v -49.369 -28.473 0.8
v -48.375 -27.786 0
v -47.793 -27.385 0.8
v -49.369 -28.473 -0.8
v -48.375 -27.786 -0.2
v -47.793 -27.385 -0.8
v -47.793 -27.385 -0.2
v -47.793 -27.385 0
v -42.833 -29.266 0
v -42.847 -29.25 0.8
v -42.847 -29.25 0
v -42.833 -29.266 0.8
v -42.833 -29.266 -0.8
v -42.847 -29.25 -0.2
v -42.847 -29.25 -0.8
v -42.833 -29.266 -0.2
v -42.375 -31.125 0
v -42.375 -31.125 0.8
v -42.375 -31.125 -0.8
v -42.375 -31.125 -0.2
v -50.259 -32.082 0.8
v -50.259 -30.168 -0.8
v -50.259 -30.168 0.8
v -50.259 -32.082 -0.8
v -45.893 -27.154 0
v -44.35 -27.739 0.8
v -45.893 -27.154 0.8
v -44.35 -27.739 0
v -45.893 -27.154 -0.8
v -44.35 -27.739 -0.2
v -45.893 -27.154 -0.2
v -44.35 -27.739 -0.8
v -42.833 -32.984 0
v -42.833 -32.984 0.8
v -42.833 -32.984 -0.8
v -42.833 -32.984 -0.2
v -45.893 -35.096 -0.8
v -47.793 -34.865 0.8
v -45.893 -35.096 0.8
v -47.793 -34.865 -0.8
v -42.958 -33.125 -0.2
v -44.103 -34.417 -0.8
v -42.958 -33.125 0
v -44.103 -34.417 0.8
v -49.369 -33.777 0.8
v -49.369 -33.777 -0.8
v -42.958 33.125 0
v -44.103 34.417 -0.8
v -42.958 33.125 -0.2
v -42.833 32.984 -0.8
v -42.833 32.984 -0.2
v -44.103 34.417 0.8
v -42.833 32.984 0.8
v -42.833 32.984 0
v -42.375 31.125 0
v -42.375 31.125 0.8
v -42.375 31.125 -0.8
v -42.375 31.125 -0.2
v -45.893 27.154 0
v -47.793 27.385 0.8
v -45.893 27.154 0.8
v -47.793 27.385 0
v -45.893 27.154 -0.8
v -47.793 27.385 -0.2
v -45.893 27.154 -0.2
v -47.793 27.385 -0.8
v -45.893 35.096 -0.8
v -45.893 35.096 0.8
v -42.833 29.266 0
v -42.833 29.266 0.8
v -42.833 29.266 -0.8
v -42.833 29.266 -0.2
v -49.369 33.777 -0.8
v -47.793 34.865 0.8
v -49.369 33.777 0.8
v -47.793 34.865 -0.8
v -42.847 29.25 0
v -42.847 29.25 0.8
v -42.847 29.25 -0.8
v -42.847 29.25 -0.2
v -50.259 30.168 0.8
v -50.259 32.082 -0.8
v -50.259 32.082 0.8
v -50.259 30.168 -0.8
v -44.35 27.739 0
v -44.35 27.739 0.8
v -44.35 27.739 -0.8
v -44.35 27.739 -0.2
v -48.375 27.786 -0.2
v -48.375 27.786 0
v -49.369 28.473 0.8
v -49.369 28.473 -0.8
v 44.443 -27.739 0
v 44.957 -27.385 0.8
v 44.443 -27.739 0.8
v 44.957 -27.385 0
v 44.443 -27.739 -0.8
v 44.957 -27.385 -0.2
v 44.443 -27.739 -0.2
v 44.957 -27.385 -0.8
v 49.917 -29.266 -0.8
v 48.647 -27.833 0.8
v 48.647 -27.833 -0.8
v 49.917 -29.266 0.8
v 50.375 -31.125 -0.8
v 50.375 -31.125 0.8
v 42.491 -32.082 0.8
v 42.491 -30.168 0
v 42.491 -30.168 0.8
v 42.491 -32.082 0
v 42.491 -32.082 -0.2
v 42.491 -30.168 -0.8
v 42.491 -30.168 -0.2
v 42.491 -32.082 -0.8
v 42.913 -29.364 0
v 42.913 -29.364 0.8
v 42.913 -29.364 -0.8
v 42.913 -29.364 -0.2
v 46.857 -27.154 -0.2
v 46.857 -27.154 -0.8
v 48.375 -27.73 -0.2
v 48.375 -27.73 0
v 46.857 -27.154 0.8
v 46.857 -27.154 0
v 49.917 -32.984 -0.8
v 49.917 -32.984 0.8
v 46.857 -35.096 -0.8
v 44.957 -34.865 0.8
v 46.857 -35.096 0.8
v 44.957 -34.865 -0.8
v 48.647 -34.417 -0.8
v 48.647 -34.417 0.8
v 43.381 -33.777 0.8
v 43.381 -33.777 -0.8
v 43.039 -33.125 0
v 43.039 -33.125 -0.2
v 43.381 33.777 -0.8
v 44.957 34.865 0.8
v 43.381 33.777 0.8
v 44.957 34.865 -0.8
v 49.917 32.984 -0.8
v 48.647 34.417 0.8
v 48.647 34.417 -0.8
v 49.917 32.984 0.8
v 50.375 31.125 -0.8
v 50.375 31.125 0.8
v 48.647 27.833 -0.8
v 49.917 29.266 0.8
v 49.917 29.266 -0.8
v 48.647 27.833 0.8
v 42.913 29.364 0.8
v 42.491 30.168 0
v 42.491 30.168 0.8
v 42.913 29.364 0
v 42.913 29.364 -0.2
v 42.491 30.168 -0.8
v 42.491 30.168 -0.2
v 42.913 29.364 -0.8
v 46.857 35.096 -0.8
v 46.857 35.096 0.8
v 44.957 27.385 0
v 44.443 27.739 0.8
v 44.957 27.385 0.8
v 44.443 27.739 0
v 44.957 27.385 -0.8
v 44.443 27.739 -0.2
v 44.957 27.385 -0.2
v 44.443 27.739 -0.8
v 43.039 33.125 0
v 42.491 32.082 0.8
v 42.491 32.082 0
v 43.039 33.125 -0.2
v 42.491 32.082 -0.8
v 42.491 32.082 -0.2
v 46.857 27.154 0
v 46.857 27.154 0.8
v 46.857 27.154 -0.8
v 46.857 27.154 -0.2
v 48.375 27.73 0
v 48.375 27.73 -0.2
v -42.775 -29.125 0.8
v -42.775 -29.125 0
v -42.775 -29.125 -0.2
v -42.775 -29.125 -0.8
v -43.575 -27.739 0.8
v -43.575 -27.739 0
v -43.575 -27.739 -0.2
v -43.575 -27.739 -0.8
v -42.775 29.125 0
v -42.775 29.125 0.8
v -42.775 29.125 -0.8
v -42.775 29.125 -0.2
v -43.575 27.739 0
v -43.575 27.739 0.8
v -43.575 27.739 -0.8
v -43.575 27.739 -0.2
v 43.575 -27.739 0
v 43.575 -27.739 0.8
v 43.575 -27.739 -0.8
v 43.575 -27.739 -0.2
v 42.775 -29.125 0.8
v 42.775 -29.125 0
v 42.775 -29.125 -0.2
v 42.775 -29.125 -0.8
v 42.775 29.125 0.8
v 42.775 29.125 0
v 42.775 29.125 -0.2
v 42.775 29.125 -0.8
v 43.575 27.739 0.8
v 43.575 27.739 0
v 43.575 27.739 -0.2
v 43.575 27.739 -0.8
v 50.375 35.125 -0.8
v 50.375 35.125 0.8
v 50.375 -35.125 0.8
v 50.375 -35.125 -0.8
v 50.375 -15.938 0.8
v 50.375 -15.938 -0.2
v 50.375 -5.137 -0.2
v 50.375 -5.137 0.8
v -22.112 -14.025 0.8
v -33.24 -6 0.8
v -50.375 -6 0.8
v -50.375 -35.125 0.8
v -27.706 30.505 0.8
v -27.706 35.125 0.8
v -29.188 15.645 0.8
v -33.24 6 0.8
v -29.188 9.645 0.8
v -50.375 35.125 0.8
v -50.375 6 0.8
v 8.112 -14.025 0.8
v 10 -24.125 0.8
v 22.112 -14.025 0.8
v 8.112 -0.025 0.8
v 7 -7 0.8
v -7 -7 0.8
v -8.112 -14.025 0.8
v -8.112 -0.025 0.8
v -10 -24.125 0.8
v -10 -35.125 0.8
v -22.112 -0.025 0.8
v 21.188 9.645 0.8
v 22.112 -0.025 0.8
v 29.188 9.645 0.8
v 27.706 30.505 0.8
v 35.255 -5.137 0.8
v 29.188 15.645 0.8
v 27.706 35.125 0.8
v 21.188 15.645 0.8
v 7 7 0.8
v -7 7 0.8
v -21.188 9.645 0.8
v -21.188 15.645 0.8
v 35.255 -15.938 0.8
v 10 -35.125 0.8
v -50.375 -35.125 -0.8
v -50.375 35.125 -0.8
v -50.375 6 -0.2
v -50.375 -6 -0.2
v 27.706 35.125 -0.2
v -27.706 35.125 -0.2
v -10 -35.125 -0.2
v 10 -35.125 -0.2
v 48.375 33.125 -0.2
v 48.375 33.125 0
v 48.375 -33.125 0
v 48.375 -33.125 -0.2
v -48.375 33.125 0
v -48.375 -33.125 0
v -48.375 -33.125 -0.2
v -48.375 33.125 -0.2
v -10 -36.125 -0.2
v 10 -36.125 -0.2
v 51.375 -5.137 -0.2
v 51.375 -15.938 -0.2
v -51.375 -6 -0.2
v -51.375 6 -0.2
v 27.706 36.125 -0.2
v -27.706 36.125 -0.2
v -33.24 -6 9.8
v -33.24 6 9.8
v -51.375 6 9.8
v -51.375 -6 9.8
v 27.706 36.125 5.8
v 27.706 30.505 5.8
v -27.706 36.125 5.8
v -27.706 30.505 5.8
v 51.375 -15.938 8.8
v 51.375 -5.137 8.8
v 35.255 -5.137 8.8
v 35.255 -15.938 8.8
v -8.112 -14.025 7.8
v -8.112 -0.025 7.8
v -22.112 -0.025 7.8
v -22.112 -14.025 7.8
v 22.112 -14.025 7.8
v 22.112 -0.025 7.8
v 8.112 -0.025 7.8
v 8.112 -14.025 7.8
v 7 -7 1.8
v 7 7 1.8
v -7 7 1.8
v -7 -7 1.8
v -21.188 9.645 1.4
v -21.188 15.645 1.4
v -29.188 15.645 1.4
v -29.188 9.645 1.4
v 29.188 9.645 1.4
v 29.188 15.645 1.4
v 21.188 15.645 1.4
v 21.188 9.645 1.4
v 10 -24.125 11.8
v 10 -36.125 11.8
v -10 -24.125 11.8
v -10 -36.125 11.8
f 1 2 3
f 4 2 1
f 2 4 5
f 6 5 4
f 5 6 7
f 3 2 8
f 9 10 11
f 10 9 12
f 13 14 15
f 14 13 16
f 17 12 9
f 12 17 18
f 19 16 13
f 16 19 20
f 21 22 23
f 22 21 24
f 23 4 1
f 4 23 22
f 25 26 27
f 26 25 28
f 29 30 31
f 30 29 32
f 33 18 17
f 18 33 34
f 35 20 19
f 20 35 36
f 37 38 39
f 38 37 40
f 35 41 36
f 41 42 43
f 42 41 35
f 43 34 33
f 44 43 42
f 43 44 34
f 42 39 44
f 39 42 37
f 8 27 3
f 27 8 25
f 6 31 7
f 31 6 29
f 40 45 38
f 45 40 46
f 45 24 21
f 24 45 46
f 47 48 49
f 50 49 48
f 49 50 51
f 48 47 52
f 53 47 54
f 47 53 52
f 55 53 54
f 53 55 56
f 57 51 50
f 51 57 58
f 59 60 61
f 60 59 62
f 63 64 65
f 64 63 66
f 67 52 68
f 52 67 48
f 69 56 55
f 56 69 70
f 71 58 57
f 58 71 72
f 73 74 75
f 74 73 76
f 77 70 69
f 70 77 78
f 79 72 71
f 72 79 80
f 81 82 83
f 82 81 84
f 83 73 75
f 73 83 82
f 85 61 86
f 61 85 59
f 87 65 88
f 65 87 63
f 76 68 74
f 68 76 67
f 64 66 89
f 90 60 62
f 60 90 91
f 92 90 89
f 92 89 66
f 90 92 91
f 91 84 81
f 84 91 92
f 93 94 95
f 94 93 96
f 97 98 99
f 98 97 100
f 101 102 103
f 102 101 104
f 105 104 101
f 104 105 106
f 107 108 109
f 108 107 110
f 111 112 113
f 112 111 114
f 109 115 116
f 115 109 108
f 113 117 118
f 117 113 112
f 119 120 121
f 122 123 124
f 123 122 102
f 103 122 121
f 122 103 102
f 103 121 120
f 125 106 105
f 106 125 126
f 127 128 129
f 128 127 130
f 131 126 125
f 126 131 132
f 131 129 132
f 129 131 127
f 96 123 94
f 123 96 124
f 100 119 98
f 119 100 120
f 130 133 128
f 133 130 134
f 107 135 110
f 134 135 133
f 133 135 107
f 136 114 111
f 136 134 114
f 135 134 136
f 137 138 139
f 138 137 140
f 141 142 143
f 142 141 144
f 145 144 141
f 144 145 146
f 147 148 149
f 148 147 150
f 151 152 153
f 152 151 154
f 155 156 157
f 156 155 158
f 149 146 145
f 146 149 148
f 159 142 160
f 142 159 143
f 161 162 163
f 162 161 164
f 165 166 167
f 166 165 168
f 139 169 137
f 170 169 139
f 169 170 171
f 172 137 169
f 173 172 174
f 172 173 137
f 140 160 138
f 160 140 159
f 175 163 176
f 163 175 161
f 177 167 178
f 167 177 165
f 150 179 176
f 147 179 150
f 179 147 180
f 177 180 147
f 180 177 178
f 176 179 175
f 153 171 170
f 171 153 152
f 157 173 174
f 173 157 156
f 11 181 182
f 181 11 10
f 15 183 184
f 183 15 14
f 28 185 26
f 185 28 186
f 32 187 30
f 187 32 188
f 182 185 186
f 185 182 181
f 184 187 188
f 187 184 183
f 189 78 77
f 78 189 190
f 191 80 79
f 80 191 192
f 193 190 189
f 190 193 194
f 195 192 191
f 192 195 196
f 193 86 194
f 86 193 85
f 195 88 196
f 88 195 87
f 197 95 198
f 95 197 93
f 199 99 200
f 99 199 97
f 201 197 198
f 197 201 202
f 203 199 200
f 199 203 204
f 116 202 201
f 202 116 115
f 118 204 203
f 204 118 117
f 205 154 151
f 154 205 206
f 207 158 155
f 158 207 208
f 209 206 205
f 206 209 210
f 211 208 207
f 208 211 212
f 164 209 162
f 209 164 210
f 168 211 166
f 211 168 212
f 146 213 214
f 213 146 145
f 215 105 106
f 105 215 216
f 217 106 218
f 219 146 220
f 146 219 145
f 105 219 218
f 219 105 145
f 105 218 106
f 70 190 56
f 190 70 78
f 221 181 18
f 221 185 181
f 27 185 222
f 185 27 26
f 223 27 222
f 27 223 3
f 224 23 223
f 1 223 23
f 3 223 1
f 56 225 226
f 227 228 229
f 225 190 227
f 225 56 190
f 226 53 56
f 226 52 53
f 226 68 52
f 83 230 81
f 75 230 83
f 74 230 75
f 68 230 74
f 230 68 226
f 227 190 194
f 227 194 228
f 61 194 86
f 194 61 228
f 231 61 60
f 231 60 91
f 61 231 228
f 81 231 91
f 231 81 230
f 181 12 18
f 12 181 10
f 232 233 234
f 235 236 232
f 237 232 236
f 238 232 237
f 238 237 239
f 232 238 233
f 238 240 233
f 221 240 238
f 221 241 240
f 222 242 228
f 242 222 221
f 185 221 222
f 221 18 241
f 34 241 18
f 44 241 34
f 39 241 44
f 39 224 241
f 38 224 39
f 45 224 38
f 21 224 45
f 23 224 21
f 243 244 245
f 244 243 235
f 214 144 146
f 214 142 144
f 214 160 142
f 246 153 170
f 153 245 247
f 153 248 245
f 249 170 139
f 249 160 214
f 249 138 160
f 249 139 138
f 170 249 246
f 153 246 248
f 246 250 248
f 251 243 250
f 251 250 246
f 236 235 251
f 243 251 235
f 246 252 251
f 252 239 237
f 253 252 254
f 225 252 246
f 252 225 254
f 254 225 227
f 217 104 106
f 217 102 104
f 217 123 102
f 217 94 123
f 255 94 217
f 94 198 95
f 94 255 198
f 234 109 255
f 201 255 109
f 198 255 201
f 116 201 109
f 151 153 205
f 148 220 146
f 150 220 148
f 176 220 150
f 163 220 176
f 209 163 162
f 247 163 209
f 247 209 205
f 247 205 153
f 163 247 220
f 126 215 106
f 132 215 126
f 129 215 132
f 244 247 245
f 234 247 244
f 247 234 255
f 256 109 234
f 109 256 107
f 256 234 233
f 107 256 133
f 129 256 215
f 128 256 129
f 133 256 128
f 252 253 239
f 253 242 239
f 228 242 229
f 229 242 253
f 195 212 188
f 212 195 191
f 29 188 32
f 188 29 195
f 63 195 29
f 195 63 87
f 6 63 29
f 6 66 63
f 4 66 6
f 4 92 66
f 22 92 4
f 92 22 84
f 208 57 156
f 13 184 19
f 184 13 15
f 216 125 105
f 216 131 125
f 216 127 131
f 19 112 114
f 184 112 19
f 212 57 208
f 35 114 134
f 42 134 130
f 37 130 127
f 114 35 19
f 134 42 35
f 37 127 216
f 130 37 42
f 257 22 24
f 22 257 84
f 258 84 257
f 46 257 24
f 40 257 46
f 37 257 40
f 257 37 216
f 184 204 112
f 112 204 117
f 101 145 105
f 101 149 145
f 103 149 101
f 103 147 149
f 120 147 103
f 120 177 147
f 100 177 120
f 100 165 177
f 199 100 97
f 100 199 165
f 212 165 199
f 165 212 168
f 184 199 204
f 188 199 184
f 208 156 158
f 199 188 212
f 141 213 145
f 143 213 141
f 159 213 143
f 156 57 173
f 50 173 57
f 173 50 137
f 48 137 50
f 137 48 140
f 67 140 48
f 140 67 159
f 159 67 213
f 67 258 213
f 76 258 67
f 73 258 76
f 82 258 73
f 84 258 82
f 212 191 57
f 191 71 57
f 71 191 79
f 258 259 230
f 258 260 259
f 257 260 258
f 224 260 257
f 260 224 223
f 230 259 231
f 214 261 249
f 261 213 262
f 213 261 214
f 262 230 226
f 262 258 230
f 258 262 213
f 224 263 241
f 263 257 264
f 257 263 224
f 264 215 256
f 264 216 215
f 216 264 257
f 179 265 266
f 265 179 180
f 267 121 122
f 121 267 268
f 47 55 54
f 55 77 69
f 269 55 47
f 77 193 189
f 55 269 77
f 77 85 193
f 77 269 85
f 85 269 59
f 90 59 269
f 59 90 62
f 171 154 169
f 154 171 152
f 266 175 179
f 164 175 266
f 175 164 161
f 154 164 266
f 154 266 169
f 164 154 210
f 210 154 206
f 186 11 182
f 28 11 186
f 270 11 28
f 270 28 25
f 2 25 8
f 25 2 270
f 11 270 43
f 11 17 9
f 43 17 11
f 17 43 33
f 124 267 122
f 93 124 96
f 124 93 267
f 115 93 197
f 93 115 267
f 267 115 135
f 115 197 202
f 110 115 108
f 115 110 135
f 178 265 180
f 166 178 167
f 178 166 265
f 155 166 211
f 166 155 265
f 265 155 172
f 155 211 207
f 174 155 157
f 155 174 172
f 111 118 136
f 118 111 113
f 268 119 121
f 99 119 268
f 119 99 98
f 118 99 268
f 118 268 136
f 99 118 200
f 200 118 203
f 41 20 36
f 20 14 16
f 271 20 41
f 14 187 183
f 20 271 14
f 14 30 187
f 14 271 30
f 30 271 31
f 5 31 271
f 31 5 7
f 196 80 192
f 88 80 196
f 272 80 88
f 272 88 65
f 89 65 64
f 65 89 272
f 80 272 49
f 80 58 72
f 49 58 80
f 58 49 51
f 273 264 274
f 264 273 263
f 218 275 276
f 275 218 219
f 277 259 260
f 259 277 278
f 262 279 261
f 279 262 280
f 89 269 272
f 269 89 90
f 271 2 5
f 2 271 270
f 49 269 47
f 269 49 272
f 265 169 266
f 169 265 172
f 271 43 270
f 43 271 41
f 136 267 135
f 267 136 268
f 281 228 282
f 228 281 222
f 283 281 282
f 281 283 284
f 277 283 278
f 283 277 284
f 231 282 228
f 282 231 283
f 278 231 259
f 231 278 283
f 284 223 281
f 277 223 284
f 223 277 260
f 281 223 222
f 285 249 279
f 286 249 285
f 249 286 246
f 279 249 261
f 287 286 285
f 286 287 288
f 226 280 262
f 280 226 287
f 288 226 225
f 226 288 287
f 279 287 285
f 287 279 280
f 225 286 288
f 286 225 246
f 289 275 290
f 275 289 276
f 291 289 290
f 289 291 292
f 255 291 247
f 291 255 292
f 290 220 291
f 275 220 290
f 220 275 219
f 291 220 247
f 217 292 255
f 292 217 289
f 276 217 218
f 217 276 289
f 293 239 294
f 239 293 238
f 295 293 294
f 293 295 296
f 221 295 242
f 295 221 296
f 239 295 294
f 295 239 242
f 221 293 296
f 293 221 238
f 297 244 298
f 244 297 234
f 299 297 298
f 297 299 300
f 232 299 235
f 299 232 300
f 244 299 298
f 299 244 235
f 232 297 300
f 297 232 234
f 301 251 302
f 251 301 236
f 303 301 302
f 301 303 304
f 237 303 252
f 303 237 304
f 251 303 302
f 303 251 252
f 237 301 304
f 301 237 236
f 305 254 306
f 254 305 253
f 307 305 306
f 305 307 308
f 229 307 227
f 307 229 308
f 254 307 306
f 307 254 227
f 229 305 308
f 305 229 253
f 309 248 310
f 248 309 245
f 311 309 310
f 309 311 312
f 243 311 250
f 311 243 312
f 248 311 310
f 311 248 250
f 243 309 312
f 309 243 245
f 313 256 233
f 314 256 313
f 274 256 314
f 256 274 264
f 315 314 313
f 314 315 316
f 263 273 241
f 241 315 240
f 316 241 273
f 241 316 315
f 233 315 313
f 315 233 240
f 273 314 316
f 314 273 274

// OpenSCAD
// Parameters
board_length = 100.75; //[50.375:201.5:0.25]
board_width = 70.25; //[35.125:140.5:0.25]
board_thickness = 1.6; //[0.8:3.2:0.1]
corner_radius = 4; //[2:8:0.5]
mount_hole_diameter = 3.2; //[2.4:4.5:0.1]
mount_hole_edge_offset_x = 6; //[3:12:0.5]
mount_hole_edge_offset_y = 6; //[3:12:0.5]
hole_cut_extra = 0.6; //[0.2:2:0.1]
overlap = 1; //[0.5:2:0.1]
silkscreen_thickness = 0.2; //[0.1:0.6:0.05]
silkscreen_margin = 2; //[1:5:0.5]
connector_height = 10; //[6:20:0.5]
connector_depth = 12; //[6:25:0.5]
connector_wall = 1.5; //[1:3:0.1]
heatsink_size_x = 14; //[8:28:0.5]
heatsink_size_y = 14; //[8:28:0.5]
heatsink_height = 8; //[4:20:0.5]
ic_qfp_size = 14; //[8:28:0.5]
ic_qfp_height = 2; //[1:5:0.1]
ic_small_size_x = 8; //[4:16:0.5]
ic_small_size_y = 6; //[3:12:0.5]
ic_small_height = 1.6; //[0.8:4:0.1]
screw_terminal_size_x = 20; //[10:40:0.5]
screw_terminal_size_y = 12; //[8:20:0.5]
screw_terminal_height = 12; //[8:25:0.5]

// Mainboard PCB with rounded corners and mounting holes
module pcb_mainboard() {
  difference() {
    // PCB base
    color([0.0, 0.4, 0.2])
    cube([board_length, board_width, board_thickness], center = true);
    
    // Corner cuts
    for (x = [-1, 1], y = [-1, 1]) {
      translate([x * (board_length / 2 - corner_radius), y * (board_width / 2 - corner_radius), 0])
        cylinder(r = corner_radius, h = board_thickness + hole_cut_extra, center = true);
    }
    
    // Mounting holes
    for (x = [-1, 1], y = [-1, 1]) {
      translate([x * (board_length / 2 - mount_hole_edge_offset_x), y * (board_width / 2 - mount_hole_edge_offset_y), 0])
        cylinder(r = mount_hole_diameter / 2, h = board_thickness + hole_cut_extra, center = true);
    }
  }
}

// Silkscreen layer
module silkscreen_layer() {
  union() {
    // Silkscreen border
    translate([0, 0, board_thickness / 2 + silkscreen_thickness / 2 - overlap])
      color("White")
      cube([board_length - 2 * silkscreen_margin, board_width - 2 * silkscreen_margin, silkscreen_thickness], center = true);
    
    // Silkscreen markings
    translate([0, board_width * 0.25, board_thickness / 2 + silkscreen_thickness / 2 - overlap])
      cube([board_length * 0.35, board_width * 0.08, silkscreen_thickness], center = true);
  }
}

// Connectors
module connectors() {
  union() {
    // USB connector
    translate([-board_length / 2 + (board_length * 0.18) / 2 - overlap, 0, board_thickness / 2 + connector_height / 2 - overlap])
      color("DimGray")
      cube([board_length * 0.18, connector_depth, connector_height], center = true);
    
    // Header connector
    translate([0, board_width / 2 - (board_width * 0.08) / 2 + overlap, board_thickness / 2 + (connector_height * 0.6) / 2 - overlap])
      cube([board_length * 0.55, board_width * 0.08, connector_height * 0.6], center = true);
    
    // Power jack
    translate([board_length / 2 - (board_length * 0.16) / 2 + overlap, -board_width * 0.15, board_thickness / 2 + (connector_height * 0.9) / 2 - overlap])
      cube([board_length * 0.16, connector_depth * 0.9, connector_height * 0.9], center = true);
  }
}

// Heatsinks
module heatsinks() {
  union() {
    // Heatsink 1
    translate([-board_length * 0.15, -board_width * 0.1, board_thickness / 2 + heatsink_height / 2 - overlap])
      color("Silver")
      cube([heatsink_size_x, heatsink_size_y, heatsink_height], center = true);
    
    // Heatsink 2
    translate([board_length * 0.15, -board_width * 0.1, board_thickness / 2 + heatsink_height / 2 - overlap])
      cube([heatsink_size_x, heatsink_size_y, heatsink_height], center = true);
  }
}

// IC Packages
module ic_packages() {
  union() {
    // Main QFP IC
    translate([0, 0, board_thickness / 2 + ic_qfp_height / 2 - overlap])
      color("Black")
      cube([ic_qfp_size, ic_qfp_size, ic_qfp_height], center = true);
    
    // Small IC 1
    translate([-board_length * 0.25, board_width * 0.18, board_thickness / 2 + ic_small_height / 2 - overlap])
      cube([ic_small_size_x, ic_small_size_y, ic_small_height], center = true);
    
    // Small IC 2
    translate([board_length * 0.25, board_width * 0.18, board_thickness / 2 + ic_small_height / 2 - overlap])
      cube([ic_small_size_x, ic_small_size_y, ic_small_height], center = true);
  }
}

// Screw Terminals
module screw_terminals() {
  translate([0, -board_width / 2 + screw_terminal_size_y / 2 - overlap, board_thickness / 2 + screw_terminal_height / 2 - overlap])
    color("DimGray")
    cube([screw_terminal_size_x, screw_terminal_size_y, screw_terminal_height], center = true);
}

// Complete Mainboard Model
module complete_mainboard_model() {
  union() {
    pcb_mainboard();
    silkscreen_layer();
    connectors();
    heatsinks();
    ic_packages();
    screw_terminals();
  }
}

// Render the complete model
complete_mainboard_model();
